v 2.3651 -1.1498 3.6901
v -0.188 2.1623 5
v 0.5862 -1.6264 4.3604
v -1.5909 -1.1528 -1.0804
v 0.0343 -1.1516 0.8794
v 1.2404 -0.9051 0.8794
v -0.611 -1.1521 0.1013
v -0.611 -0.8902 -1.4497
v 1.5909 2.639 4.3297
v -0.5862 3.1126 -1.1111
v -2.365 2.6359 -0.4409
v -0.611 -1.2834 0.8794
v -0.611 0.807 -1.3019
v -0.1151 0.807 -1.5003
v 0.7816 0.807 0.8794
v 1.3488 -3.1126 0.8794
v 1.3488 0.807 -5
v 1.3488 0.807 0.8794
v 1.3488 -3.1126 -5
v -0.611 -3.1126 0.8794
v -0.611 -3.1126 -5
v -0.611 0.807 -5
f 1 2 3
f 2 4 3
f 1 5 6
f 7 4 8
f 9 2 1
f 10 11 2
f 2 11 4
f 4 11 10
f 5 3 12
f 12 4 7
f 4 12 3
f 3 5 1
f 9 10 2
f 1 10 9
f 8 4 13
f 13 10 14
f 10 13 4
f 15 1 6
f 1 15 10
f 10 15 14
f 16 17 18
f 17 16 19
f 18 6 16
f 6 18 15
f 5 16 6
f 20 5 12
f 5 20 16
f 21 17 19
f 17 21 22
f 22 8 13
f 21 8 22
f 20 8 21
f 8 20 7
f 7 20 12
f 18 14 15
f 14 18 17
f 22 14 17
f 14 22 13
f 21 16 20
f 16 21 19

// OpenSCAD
translate([-1.590857, -1.152804, -1.080430])
union() {
  rotate([10, 20, 15])
  cube(size = [1.959785, 3.919570, 5.879356], center = false);
  translate([0.979893, -1.959785, -3.919570])
  cube(size = [1.959785, 3.919570, 5.879356], center = false);
}
